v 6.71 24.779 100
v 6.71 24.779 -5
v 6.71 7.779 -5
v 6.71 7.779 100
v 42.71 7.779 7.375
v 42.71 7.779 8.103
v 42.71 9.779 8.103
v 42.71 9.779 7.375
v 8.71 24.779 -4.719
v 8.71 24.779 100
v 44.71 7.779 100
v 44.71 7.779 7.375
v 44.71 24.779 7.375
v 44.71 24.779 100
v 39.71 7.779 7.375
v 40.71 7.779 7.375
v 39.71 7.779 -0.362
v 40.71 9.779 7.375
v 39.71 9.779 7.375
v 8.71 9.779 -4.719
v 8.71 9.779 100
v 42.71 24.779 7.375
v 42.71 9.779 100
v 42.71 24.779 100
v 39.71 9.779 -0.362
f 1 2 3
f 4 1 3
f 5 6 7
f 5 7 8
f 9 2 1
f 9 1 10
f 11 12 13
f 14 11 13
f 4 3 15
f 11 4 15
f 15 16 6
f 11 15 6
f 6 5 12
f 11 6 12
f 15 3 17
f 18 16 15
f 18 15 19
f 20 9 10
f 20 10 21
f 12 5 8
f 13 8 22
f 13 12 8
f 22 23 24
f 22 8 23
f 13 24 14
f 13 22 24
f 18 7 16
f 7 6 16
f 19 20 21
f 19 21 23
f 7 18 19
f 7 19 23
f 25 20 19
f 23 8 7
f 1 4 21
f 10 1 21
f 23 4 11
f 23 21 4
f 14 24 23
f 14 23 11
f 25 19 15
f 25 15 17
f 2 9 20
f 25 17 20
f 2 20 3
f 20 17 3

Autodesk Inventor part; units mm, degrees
ref_plane "XZ Plane" through (0, 0, 0) normal (0, 1, 0) x (-1, 0, 0)
ref_plane "XY Plane" through (0, 0, 0) normal (0, 0, 1) x (1, 0, 0)
sketch "Sketch1" plane through (0, 0, 0) normal (0, 0, 1) x (1, 0, 0)
  line L0 (10.7104, 9.7791) -> (42.7104, 9.7791)
  line L1 (42.7104, 9.7791) -> (42.7104, 24.7791)
  line L2 (10.7104, 9.7791) -> (10.7104, 24.7791)
  line L3 (8.7104, 24.7791) -> (8.7104, 7.7791)
  line L4 (8.7104, 7.7791) -> (44.7104, 7.7791)
  line L5 (44.7104, 7.7791) -> (44.7104, 24.7791)
  line L6 (8.7104, 24.7791) -> (10.7104, 24.7791)
  line L7 (42.7104, 24.7791) -> (44.7104, 24.7791)
  point P0 (0, 0)
  dimension "d0" = 32
  dimension "d1" = 15
  dimension "d2" = 15
  dimension "d3" = 2
extrude "Extrusion1" add sketch "Sketch1" along normal blind 100 and the other way blind 5
sketch "Sketch3" plane through (10.7104, 9.7791, 100) normal (0, 1, 0) x (1, 0, 0)
  line L0 (-2, 105) -> (-2, 0) projected
  line L1 (-2, 91.8971) -> (-2, 105)
  line L2 (32, 105) -> (34, 105) projected
  line L3 (34, 105) -> (-2, 91.8971)
  line L4 (-2, 105) -> (-2, 91.8971)
  line L5 (-2, 105) -> (34, 105)
  line L6 (0, 105) -> (0, 0) projected
  line L7 (0, 92.625) -> (0, 105)
  line L8 (34, 105) -> (-2, 99.9405)
  line L9 (34, 105) -> (70.3538, 105) construction
  line L10 (-2, 99.9405) -> (-2, 105)
  point P0 (-10.7104, 100)
  point P1 (-2, 99.9405)
  point P2 (0, 100.2216)
  dimension "d15" = 20
  dimension "d16" = 172
extrude "Extrusion4" cut sketch "Sketch3" along normal through all both and the other way through all contours L5 L6 L8 L0 | L5 L2 L8 L6
extrude "Extrusion5" cut sketch "Sketch3" along normal through all both and the other way through all contours L8 L6 L3 L0
ref_plane "Work Plane1" through (25.71, 0, 0) normal (1, 0, 0) x (0, 1, 0)
mirror "Mirror1" about plane through (25.71, 0, 0) normal (1, 0, 0) of "Extrusion5", "Extrusion4", "Extrusion1"
sketch "Sketch4" plane through (44.7104, 7.7791, 100) normal (1, 0, 0) x (0, 0, -1)
  line L0 (92.625, 2) -> (92.625, 17) projected
  line L1 (92.625, 17) -> (92.625, 2)
  line L2 (92.625, 2) -> (105, 2)
  line L3 (105, 17) -> (105, 0) projected
  line L4 (104.7189, 17) -> (0, 17) projected
  line L5 (105, 17) -> (93.3527, 17)
  line L6 (92.625, 2) -> (92.625, 0)
  line L7 (105, 0) -> (0, 0) projected
  line L8 (92.625, 0) -> (105, 0)
  line L9 (105, 0) -> (105, 2)
  line L10 (92.625, 17) -> (0, 17)
  line L11 (0, 0) -> (0, 17) projected
  line L12 (91.8971, 2) -> (0, 2) projected
  line L13 (0, 2) -> (91.8971, 2)
  point P0 (100, -7.7791)
  point P1 (95.3874, 17)
sketch "Sketch5" plane through (25.71, 0, 0) normal (1, 0, 0) x (0, 1, 0)
  line L0 (7.7791, 100) -> (24.7791, 100) projected
  line L1 (24.7791, 100) -> (9.7791, 100)
  line L2 (7.7791, 7.375) -> (9.7791, 7.375) projected
  line L3 (9.7791, 100) -> (9.7791, 7.375)
  line L4 (9.7791, 7.375) -> (24.7791, 7.375)
  line L5 (24.7791, 7.375) -> (24.7791, 100)
  line L6 (9.7791, 7.375) -> (9.7791, 100)
  point P0 (0, 0)
  dimension "d24" = 15
extrude "Extrusion7" cut sketch "Sketch5" along normal mid plane 34
extrude "Extrusion8" cut sketch "Sketch4" against normal blind 5 contours L0 L4 L5 L3 L2 | L2 L3 L7 L6
equation "\"BendRadius\" = Thickness"
equation "\"BendReliefWidth\" = Thickness"
equation "\"BendReliefDepth\" = 0.5 * Thickness"
equation "\"CornerReliefSize\" = 4 * Thickness"
equation "\"MinimumRemnant\" = 2 * Thickness"
equation "\"TransitionRadius\" = BendRadius"
equation "\"JacobiRadiusSize\" = BendRadius"
equation "\"GapSize\" = Thickness"
equation "\"Thickness\" = 0.5"
properties part number "outslideleft"
